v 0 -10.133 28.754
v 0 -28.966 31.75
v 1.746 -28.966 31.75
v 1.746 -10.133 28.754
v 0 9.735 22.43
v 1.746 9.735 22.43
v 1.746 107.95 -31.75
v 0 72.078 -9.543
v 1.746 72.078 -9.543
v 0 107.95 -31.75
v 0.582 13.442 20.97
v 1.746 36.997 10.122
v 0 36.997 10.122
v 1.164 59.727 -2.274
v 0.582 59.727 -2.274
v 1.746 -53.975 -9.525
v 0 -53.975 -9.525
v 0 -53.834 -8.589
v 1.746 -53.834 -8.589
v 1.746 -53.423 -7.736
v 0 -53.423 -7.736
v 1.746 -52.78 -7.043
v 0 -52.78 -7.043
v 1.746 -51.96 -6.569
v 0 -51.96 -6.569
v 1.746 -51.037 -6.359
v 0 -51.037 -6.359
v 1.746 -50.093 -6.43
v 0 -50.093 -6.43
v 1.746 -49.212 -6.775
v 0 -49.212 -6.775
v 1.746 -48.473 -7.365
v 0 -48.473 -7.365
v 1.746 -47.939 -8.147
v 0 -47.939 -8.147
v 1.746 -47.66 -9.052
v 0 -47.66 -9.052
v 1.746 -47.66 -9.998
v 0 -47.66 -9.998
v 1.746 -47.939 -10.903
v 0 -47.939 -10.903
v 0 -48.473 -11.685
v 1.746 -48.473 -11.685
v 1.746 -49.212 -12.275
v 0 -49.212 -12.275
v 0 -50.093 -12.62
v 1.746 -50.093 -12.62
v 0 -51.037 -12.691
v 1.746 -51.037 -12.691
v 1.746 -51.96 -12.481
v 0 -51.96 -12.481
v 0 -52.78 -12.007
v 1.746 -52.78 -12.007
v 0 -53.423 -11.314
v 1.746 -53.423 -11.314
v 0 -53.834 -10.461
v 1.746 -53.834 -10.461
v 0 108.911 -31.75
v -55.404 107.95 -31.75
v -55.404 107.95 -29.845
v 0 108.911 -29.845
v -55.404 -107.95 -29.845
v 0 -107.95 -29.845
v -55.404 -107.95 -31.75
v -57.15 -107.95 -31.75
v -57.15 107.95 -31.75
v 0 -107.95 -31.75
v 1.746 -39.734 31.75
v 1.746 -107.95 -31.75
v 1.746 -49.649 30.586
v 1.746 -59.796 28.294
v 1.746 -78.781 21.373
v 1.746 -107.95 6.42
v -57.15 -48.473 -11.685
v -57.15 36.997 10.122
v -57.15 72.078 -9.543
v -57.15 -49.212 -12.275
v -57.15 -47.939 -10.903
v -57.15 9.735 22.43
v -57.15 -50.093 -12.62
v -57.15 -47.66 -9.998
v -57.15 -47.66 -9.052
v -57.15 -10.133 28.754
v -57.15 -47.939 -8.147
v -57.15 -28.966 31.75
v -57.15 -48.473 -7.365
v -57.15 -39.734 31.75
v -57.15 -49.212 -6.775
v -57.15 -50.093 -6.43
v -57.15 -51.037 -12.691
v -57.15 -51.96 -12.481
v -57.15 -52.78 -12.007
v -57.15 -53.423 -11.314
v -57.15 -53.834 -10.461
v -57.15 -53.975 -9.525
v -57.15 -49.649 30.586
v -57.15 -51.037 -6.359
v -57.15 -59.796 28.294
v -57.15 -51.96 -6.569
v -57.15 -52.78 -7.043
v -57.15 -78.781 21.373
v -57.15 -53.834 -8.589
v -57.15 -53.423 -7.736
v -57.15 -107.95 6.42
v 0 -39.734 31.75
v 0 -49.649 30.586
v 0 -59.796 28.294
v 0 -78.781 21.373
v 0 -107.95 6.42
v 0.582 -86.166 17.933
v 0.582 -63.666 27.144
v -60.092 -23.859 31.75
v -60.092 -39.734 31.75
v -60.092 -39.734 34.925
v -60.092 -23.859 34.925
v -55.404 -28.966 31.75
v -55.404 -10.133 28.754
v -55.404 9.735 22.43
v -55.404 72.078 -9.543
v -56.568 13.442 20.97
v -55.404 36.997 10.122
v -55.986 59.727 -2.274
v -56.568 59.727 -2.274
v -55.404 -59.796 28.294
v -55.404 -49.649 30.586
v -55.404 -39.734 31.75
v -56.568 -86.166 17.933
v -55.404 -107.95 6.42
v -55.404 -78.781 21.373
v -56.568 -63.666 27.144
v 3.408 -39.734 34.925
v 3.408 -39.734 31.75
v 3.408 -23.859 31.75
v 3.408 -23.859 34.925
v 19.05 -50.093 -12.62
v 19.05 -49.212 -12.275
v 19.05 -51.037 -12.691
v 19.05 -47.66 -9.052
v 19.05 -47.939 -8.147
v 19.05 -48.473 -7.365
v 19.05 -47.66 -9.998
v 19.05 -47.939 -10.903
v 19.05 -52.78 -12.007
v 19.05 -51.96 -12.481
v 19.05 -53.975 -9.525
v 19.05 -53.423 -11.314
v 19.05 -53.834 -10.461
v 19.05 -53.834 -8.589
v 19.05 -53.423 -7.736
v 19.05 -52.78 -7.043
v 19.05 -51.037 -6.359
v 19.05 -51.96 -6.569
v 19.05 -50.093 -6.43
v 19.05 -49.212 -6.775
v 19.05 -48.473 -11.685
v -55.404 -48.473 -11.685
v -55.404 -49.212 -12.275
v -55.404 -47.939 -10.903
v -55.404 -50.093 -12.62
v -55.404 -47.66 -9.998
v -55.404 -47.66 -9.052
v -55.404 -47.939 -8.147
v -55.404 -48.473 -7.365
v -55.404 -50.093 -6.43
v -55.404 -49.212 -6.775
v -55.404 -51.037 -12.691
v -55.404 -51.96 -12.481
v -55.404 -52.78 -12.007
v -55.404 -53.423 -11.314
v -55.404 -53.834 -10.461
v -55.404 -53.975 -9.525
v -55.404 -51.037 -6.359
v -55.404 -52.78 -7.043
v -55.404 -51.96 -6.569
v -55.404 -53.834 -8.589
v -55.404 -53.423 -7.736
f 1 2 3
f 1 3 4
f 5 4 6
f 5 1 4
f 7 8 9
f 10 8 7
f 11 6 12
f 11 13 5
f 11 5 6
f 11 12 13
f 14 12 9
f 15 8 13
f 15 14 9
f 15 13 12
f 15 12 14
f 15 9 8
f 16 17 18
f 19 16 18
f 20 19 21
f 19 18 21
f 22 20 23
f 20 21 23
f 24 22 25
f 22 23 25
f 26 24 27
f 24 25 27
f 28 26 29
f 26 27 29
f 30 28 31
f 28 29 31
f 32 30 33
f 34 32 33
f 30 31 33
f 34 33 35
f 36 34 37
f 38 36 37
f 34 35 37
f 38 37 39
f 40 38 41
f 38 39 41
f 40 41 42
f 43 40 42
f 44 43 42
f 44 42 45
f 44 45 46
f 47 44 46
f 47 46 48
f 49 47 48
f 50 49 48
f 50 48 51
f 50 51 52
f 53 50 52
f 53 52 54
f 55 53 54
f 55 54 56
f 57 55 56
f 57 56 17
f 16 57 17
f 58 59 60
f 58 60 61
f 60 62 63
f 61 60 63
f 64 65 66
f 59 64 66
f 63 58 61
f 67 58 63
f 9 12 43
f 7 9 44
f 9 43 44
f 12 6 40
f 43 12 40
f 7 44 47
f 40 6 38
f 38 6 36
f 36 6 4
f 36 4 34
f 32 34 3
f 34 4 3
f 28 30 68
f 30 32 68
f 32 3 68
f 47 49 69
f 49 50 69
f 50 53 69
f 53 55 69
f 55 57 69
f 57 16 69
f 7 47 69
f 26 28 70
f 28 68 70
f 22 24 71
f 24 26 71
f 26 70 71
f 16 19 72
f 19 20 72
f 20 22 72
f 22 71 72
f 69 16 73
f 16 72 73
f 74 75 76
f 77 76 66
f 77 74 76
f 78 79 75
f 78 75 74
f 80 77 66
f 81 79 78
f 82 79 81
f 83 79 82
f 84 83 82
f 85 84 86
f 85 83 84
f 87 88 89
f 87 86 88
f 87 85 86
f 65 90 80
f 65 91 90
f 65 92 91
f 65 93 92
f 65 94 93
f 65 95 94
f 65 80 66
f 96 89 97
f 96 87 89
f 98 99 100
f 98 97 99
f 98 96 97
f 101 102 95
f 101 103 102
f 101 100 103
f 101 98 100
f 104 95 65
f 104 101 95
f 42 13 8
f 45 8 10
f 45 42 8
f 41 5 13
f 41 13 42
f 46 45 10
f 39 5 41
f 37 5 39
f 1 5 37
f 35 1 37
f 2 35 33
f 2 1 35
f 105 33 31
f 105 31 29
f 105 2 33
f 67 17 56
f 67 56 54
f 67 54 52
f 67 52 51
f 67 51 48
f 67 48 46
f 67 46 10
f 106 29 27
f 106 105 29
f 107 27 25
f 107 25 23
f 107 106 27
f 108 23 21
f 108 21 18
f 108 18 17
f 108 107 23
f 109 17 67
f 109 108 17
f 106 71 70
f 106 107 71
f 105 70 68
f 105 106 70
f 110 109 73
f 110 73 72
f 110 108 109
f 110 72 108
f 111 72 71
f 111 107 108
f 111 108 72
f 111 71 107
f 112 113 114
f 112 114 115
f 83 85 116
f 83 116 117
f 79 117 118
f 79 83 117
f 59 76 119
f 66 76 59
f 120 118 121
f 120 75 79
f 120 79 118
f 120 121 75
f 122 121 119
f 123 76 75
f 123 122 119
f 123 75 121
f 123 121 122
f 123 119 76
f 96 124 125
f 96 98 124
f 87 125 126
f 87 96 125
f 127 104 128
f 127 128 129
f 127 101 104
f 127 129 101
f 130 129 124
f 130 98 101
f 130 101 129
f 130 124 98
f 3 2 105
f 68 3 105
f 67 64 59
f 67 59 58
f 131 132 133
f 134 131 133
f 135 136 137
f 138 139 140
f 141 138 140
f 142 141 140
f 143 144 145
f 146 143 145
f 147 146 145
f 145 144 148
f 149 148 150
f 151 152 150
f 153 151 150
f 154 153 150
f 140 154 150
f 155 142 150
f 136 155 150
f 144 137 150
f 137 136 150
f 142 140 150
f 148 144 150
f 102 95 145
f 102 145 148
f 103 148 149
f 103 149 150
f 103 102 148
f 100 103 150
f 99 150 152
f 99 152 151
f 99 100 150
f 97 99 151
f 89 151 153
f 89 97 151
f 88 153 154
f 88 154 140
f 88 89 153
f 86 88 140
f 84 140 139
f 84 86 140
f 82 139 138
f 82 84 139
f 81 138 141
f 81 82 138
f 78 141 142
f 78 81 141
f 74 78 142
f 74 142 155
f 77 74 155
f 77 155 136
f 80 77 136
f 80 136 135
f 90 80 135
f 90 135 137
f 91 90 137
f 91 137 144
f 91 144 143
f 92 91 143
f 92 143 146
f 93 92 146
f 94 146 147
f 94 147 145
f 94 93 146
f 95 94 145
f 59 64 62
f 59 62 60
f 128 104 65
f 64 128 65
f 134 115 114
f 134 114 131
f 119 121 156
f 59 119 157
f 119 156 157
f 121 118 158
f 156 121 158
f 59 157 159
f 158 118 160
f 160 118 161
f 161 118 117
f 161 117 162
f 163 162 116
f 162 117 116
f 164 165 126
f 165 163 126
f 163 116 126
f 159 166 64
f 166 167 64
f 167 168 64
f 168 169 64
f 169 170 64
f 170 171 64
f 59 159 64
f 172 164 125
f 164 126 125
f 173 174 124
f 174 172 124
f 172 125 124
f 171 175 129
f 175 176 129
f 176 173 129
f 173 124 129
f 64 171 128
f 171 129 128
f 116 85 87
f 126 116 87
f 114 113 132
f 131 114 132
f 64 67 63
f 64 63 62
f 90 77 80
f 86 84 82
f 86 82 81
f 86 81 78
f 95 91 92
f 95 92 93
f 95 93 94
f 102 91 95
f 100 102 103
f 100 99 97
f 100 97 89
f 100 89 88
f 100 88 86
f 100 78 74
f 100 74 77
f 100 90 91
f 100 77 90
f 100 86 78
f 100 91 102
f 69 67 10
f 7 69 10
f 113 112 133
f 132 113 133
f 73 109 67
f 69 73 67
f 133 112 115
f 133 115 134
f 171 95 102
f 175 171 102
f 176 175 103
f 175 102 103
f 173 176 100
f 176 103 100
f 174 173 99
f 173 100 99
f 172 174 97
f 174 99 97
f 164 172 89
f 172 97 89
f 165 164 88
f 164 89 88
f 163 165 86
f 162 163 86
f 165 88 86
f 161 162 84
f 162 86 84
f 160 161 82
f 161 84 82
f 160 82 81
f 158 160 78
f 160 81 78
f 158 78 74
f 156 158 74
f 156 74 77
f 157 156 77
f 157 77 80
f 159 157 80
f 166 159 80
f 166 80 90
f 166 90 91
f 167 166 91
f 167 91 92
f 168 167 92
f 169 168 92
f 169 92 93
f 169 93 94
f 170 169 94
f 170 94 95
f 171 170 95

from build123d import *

# Parameters (mm, degrees)
F1_DEPTH  = 1.74621
F4_DEPTH  = 1.905
F6_R      = 3.175
F7_DEPTH  = 58.8972101
F5_W      = 63.5
F5_H      = 15.875
F8_DEPTH  = 3.175
F9_R      = 3.175
F10_DEPTH = 61.8395109511
F11_DEPTH = 76.2


with BuildPart() as f1:
    # F0 (on Right) → F1 (new body)
    with BuildSketch(Plane.YZ):
        with BuildLine():
            add(Edge.make_bspline(
                [(-28.9664380252, 31.75), (10.8579386516, 29.2793732296), (59.4039693258, -1.2353133852), (107.95, -31.75)],
                knots=[0.4257293713, 0.4257293713, 0.4257293713, 0.4257293713, 1, 1, 1, 1], degree=3))
            Line((-28.9664380252, 31.75), (-39.7336066837, 31.75))
            add(Edge.make_bspline(
                [(-107.95, 6.4195892774), (-86.2854045364, 18.3171054864), (-64.6208090729, 30.2146216955), (-39.7336066837, 31.75)],
                knots=[0, 0, 0, 0, 0.3729567186, 0.3729567186, 0.3729567186, 0.3729567186], degree=3))
            Line((-107.95, 6.4195892774), (-107.95, -31.75))
            Line((-107.95, -31.75), (107.95, -31.75))
        make_face()
    extrude(amount=F1_DEPTH)


with BuildPart() as f2_1:
    # F2: copy of F1
    add(f1.part.moved(Location((-57.15, 0, 0))))


with BuildPart() as f4:
    # F3 (on face) → F4 (new body)
    with BuildSketch(Plane(origin=(0, 0, -31.75), x_dir=(1, 0, 0), z_dir=(0, 0, -1))):
        Polygon((0, 107.95), (-55.40379, 107.95), (-55.40379, -107.95), (0, -108.9111939073), align=None)
    extrude(amount=-F4_DEPTH)


with BuildPart() as f7_tool:
    # F6 (on face) → F7 (new body, through all)
    with BuildSketch(Plane(origin=(-57.15, 0, 0), x_dir=(0, -1, 0), z_dir=(-1, 0, 0))):
        with Locations((50.8, -9.525)):
            Circle(F6_R)
    extrude(amount=-F7_DEPTH)


with BuildPart() as f1_1:
    add(f1.part)

    # F7: cut by f7_tool
    add(f7_tool.part, mode=Mode.SUBTRACT)

    # F9 (on face) → F10 (cut, through all)
    with BuildSketch(Plane.YZ.offset(1.74621)):
        with Locations((-50.8, -9.525)):
            Circle(F9_R)
    extrude(amount=-F10_DEPTH, mode=Mode.SUBTRACT)


with BuildPart() as f2_1_1:
    add(f2_1.part)

    # F7: cut by f7_tool
    add(f7_tool.part, mode=Mode.SUBTRACT)


with BuildPart() as f8:
    # F5 (on face) → F8 (new body)
    with BuildSketch(Plane.XY.offset(31.75)):
        with Locations((-28.3423009511, -31.7961066837)):
            Rectangle(F5_W, F5_H)
    extrude(amount=F8_DEPTH)


with BuildPart() as f11:
    # F6 (on face) → F11 (new body)
    with BuildSketch(Plane(origin=(-57.15, 0, 0), x_dir=(0, -1, 0), z_dir=(-1, 0, 0))):
        with Locations((50.8, -9.525)):
            Circle(F6_R)
    extrude(amount=-F11_DEPTH)


solid = Compound([f4.part, f1_1.part, f2_1_1.part, f8.part, f11.part])
